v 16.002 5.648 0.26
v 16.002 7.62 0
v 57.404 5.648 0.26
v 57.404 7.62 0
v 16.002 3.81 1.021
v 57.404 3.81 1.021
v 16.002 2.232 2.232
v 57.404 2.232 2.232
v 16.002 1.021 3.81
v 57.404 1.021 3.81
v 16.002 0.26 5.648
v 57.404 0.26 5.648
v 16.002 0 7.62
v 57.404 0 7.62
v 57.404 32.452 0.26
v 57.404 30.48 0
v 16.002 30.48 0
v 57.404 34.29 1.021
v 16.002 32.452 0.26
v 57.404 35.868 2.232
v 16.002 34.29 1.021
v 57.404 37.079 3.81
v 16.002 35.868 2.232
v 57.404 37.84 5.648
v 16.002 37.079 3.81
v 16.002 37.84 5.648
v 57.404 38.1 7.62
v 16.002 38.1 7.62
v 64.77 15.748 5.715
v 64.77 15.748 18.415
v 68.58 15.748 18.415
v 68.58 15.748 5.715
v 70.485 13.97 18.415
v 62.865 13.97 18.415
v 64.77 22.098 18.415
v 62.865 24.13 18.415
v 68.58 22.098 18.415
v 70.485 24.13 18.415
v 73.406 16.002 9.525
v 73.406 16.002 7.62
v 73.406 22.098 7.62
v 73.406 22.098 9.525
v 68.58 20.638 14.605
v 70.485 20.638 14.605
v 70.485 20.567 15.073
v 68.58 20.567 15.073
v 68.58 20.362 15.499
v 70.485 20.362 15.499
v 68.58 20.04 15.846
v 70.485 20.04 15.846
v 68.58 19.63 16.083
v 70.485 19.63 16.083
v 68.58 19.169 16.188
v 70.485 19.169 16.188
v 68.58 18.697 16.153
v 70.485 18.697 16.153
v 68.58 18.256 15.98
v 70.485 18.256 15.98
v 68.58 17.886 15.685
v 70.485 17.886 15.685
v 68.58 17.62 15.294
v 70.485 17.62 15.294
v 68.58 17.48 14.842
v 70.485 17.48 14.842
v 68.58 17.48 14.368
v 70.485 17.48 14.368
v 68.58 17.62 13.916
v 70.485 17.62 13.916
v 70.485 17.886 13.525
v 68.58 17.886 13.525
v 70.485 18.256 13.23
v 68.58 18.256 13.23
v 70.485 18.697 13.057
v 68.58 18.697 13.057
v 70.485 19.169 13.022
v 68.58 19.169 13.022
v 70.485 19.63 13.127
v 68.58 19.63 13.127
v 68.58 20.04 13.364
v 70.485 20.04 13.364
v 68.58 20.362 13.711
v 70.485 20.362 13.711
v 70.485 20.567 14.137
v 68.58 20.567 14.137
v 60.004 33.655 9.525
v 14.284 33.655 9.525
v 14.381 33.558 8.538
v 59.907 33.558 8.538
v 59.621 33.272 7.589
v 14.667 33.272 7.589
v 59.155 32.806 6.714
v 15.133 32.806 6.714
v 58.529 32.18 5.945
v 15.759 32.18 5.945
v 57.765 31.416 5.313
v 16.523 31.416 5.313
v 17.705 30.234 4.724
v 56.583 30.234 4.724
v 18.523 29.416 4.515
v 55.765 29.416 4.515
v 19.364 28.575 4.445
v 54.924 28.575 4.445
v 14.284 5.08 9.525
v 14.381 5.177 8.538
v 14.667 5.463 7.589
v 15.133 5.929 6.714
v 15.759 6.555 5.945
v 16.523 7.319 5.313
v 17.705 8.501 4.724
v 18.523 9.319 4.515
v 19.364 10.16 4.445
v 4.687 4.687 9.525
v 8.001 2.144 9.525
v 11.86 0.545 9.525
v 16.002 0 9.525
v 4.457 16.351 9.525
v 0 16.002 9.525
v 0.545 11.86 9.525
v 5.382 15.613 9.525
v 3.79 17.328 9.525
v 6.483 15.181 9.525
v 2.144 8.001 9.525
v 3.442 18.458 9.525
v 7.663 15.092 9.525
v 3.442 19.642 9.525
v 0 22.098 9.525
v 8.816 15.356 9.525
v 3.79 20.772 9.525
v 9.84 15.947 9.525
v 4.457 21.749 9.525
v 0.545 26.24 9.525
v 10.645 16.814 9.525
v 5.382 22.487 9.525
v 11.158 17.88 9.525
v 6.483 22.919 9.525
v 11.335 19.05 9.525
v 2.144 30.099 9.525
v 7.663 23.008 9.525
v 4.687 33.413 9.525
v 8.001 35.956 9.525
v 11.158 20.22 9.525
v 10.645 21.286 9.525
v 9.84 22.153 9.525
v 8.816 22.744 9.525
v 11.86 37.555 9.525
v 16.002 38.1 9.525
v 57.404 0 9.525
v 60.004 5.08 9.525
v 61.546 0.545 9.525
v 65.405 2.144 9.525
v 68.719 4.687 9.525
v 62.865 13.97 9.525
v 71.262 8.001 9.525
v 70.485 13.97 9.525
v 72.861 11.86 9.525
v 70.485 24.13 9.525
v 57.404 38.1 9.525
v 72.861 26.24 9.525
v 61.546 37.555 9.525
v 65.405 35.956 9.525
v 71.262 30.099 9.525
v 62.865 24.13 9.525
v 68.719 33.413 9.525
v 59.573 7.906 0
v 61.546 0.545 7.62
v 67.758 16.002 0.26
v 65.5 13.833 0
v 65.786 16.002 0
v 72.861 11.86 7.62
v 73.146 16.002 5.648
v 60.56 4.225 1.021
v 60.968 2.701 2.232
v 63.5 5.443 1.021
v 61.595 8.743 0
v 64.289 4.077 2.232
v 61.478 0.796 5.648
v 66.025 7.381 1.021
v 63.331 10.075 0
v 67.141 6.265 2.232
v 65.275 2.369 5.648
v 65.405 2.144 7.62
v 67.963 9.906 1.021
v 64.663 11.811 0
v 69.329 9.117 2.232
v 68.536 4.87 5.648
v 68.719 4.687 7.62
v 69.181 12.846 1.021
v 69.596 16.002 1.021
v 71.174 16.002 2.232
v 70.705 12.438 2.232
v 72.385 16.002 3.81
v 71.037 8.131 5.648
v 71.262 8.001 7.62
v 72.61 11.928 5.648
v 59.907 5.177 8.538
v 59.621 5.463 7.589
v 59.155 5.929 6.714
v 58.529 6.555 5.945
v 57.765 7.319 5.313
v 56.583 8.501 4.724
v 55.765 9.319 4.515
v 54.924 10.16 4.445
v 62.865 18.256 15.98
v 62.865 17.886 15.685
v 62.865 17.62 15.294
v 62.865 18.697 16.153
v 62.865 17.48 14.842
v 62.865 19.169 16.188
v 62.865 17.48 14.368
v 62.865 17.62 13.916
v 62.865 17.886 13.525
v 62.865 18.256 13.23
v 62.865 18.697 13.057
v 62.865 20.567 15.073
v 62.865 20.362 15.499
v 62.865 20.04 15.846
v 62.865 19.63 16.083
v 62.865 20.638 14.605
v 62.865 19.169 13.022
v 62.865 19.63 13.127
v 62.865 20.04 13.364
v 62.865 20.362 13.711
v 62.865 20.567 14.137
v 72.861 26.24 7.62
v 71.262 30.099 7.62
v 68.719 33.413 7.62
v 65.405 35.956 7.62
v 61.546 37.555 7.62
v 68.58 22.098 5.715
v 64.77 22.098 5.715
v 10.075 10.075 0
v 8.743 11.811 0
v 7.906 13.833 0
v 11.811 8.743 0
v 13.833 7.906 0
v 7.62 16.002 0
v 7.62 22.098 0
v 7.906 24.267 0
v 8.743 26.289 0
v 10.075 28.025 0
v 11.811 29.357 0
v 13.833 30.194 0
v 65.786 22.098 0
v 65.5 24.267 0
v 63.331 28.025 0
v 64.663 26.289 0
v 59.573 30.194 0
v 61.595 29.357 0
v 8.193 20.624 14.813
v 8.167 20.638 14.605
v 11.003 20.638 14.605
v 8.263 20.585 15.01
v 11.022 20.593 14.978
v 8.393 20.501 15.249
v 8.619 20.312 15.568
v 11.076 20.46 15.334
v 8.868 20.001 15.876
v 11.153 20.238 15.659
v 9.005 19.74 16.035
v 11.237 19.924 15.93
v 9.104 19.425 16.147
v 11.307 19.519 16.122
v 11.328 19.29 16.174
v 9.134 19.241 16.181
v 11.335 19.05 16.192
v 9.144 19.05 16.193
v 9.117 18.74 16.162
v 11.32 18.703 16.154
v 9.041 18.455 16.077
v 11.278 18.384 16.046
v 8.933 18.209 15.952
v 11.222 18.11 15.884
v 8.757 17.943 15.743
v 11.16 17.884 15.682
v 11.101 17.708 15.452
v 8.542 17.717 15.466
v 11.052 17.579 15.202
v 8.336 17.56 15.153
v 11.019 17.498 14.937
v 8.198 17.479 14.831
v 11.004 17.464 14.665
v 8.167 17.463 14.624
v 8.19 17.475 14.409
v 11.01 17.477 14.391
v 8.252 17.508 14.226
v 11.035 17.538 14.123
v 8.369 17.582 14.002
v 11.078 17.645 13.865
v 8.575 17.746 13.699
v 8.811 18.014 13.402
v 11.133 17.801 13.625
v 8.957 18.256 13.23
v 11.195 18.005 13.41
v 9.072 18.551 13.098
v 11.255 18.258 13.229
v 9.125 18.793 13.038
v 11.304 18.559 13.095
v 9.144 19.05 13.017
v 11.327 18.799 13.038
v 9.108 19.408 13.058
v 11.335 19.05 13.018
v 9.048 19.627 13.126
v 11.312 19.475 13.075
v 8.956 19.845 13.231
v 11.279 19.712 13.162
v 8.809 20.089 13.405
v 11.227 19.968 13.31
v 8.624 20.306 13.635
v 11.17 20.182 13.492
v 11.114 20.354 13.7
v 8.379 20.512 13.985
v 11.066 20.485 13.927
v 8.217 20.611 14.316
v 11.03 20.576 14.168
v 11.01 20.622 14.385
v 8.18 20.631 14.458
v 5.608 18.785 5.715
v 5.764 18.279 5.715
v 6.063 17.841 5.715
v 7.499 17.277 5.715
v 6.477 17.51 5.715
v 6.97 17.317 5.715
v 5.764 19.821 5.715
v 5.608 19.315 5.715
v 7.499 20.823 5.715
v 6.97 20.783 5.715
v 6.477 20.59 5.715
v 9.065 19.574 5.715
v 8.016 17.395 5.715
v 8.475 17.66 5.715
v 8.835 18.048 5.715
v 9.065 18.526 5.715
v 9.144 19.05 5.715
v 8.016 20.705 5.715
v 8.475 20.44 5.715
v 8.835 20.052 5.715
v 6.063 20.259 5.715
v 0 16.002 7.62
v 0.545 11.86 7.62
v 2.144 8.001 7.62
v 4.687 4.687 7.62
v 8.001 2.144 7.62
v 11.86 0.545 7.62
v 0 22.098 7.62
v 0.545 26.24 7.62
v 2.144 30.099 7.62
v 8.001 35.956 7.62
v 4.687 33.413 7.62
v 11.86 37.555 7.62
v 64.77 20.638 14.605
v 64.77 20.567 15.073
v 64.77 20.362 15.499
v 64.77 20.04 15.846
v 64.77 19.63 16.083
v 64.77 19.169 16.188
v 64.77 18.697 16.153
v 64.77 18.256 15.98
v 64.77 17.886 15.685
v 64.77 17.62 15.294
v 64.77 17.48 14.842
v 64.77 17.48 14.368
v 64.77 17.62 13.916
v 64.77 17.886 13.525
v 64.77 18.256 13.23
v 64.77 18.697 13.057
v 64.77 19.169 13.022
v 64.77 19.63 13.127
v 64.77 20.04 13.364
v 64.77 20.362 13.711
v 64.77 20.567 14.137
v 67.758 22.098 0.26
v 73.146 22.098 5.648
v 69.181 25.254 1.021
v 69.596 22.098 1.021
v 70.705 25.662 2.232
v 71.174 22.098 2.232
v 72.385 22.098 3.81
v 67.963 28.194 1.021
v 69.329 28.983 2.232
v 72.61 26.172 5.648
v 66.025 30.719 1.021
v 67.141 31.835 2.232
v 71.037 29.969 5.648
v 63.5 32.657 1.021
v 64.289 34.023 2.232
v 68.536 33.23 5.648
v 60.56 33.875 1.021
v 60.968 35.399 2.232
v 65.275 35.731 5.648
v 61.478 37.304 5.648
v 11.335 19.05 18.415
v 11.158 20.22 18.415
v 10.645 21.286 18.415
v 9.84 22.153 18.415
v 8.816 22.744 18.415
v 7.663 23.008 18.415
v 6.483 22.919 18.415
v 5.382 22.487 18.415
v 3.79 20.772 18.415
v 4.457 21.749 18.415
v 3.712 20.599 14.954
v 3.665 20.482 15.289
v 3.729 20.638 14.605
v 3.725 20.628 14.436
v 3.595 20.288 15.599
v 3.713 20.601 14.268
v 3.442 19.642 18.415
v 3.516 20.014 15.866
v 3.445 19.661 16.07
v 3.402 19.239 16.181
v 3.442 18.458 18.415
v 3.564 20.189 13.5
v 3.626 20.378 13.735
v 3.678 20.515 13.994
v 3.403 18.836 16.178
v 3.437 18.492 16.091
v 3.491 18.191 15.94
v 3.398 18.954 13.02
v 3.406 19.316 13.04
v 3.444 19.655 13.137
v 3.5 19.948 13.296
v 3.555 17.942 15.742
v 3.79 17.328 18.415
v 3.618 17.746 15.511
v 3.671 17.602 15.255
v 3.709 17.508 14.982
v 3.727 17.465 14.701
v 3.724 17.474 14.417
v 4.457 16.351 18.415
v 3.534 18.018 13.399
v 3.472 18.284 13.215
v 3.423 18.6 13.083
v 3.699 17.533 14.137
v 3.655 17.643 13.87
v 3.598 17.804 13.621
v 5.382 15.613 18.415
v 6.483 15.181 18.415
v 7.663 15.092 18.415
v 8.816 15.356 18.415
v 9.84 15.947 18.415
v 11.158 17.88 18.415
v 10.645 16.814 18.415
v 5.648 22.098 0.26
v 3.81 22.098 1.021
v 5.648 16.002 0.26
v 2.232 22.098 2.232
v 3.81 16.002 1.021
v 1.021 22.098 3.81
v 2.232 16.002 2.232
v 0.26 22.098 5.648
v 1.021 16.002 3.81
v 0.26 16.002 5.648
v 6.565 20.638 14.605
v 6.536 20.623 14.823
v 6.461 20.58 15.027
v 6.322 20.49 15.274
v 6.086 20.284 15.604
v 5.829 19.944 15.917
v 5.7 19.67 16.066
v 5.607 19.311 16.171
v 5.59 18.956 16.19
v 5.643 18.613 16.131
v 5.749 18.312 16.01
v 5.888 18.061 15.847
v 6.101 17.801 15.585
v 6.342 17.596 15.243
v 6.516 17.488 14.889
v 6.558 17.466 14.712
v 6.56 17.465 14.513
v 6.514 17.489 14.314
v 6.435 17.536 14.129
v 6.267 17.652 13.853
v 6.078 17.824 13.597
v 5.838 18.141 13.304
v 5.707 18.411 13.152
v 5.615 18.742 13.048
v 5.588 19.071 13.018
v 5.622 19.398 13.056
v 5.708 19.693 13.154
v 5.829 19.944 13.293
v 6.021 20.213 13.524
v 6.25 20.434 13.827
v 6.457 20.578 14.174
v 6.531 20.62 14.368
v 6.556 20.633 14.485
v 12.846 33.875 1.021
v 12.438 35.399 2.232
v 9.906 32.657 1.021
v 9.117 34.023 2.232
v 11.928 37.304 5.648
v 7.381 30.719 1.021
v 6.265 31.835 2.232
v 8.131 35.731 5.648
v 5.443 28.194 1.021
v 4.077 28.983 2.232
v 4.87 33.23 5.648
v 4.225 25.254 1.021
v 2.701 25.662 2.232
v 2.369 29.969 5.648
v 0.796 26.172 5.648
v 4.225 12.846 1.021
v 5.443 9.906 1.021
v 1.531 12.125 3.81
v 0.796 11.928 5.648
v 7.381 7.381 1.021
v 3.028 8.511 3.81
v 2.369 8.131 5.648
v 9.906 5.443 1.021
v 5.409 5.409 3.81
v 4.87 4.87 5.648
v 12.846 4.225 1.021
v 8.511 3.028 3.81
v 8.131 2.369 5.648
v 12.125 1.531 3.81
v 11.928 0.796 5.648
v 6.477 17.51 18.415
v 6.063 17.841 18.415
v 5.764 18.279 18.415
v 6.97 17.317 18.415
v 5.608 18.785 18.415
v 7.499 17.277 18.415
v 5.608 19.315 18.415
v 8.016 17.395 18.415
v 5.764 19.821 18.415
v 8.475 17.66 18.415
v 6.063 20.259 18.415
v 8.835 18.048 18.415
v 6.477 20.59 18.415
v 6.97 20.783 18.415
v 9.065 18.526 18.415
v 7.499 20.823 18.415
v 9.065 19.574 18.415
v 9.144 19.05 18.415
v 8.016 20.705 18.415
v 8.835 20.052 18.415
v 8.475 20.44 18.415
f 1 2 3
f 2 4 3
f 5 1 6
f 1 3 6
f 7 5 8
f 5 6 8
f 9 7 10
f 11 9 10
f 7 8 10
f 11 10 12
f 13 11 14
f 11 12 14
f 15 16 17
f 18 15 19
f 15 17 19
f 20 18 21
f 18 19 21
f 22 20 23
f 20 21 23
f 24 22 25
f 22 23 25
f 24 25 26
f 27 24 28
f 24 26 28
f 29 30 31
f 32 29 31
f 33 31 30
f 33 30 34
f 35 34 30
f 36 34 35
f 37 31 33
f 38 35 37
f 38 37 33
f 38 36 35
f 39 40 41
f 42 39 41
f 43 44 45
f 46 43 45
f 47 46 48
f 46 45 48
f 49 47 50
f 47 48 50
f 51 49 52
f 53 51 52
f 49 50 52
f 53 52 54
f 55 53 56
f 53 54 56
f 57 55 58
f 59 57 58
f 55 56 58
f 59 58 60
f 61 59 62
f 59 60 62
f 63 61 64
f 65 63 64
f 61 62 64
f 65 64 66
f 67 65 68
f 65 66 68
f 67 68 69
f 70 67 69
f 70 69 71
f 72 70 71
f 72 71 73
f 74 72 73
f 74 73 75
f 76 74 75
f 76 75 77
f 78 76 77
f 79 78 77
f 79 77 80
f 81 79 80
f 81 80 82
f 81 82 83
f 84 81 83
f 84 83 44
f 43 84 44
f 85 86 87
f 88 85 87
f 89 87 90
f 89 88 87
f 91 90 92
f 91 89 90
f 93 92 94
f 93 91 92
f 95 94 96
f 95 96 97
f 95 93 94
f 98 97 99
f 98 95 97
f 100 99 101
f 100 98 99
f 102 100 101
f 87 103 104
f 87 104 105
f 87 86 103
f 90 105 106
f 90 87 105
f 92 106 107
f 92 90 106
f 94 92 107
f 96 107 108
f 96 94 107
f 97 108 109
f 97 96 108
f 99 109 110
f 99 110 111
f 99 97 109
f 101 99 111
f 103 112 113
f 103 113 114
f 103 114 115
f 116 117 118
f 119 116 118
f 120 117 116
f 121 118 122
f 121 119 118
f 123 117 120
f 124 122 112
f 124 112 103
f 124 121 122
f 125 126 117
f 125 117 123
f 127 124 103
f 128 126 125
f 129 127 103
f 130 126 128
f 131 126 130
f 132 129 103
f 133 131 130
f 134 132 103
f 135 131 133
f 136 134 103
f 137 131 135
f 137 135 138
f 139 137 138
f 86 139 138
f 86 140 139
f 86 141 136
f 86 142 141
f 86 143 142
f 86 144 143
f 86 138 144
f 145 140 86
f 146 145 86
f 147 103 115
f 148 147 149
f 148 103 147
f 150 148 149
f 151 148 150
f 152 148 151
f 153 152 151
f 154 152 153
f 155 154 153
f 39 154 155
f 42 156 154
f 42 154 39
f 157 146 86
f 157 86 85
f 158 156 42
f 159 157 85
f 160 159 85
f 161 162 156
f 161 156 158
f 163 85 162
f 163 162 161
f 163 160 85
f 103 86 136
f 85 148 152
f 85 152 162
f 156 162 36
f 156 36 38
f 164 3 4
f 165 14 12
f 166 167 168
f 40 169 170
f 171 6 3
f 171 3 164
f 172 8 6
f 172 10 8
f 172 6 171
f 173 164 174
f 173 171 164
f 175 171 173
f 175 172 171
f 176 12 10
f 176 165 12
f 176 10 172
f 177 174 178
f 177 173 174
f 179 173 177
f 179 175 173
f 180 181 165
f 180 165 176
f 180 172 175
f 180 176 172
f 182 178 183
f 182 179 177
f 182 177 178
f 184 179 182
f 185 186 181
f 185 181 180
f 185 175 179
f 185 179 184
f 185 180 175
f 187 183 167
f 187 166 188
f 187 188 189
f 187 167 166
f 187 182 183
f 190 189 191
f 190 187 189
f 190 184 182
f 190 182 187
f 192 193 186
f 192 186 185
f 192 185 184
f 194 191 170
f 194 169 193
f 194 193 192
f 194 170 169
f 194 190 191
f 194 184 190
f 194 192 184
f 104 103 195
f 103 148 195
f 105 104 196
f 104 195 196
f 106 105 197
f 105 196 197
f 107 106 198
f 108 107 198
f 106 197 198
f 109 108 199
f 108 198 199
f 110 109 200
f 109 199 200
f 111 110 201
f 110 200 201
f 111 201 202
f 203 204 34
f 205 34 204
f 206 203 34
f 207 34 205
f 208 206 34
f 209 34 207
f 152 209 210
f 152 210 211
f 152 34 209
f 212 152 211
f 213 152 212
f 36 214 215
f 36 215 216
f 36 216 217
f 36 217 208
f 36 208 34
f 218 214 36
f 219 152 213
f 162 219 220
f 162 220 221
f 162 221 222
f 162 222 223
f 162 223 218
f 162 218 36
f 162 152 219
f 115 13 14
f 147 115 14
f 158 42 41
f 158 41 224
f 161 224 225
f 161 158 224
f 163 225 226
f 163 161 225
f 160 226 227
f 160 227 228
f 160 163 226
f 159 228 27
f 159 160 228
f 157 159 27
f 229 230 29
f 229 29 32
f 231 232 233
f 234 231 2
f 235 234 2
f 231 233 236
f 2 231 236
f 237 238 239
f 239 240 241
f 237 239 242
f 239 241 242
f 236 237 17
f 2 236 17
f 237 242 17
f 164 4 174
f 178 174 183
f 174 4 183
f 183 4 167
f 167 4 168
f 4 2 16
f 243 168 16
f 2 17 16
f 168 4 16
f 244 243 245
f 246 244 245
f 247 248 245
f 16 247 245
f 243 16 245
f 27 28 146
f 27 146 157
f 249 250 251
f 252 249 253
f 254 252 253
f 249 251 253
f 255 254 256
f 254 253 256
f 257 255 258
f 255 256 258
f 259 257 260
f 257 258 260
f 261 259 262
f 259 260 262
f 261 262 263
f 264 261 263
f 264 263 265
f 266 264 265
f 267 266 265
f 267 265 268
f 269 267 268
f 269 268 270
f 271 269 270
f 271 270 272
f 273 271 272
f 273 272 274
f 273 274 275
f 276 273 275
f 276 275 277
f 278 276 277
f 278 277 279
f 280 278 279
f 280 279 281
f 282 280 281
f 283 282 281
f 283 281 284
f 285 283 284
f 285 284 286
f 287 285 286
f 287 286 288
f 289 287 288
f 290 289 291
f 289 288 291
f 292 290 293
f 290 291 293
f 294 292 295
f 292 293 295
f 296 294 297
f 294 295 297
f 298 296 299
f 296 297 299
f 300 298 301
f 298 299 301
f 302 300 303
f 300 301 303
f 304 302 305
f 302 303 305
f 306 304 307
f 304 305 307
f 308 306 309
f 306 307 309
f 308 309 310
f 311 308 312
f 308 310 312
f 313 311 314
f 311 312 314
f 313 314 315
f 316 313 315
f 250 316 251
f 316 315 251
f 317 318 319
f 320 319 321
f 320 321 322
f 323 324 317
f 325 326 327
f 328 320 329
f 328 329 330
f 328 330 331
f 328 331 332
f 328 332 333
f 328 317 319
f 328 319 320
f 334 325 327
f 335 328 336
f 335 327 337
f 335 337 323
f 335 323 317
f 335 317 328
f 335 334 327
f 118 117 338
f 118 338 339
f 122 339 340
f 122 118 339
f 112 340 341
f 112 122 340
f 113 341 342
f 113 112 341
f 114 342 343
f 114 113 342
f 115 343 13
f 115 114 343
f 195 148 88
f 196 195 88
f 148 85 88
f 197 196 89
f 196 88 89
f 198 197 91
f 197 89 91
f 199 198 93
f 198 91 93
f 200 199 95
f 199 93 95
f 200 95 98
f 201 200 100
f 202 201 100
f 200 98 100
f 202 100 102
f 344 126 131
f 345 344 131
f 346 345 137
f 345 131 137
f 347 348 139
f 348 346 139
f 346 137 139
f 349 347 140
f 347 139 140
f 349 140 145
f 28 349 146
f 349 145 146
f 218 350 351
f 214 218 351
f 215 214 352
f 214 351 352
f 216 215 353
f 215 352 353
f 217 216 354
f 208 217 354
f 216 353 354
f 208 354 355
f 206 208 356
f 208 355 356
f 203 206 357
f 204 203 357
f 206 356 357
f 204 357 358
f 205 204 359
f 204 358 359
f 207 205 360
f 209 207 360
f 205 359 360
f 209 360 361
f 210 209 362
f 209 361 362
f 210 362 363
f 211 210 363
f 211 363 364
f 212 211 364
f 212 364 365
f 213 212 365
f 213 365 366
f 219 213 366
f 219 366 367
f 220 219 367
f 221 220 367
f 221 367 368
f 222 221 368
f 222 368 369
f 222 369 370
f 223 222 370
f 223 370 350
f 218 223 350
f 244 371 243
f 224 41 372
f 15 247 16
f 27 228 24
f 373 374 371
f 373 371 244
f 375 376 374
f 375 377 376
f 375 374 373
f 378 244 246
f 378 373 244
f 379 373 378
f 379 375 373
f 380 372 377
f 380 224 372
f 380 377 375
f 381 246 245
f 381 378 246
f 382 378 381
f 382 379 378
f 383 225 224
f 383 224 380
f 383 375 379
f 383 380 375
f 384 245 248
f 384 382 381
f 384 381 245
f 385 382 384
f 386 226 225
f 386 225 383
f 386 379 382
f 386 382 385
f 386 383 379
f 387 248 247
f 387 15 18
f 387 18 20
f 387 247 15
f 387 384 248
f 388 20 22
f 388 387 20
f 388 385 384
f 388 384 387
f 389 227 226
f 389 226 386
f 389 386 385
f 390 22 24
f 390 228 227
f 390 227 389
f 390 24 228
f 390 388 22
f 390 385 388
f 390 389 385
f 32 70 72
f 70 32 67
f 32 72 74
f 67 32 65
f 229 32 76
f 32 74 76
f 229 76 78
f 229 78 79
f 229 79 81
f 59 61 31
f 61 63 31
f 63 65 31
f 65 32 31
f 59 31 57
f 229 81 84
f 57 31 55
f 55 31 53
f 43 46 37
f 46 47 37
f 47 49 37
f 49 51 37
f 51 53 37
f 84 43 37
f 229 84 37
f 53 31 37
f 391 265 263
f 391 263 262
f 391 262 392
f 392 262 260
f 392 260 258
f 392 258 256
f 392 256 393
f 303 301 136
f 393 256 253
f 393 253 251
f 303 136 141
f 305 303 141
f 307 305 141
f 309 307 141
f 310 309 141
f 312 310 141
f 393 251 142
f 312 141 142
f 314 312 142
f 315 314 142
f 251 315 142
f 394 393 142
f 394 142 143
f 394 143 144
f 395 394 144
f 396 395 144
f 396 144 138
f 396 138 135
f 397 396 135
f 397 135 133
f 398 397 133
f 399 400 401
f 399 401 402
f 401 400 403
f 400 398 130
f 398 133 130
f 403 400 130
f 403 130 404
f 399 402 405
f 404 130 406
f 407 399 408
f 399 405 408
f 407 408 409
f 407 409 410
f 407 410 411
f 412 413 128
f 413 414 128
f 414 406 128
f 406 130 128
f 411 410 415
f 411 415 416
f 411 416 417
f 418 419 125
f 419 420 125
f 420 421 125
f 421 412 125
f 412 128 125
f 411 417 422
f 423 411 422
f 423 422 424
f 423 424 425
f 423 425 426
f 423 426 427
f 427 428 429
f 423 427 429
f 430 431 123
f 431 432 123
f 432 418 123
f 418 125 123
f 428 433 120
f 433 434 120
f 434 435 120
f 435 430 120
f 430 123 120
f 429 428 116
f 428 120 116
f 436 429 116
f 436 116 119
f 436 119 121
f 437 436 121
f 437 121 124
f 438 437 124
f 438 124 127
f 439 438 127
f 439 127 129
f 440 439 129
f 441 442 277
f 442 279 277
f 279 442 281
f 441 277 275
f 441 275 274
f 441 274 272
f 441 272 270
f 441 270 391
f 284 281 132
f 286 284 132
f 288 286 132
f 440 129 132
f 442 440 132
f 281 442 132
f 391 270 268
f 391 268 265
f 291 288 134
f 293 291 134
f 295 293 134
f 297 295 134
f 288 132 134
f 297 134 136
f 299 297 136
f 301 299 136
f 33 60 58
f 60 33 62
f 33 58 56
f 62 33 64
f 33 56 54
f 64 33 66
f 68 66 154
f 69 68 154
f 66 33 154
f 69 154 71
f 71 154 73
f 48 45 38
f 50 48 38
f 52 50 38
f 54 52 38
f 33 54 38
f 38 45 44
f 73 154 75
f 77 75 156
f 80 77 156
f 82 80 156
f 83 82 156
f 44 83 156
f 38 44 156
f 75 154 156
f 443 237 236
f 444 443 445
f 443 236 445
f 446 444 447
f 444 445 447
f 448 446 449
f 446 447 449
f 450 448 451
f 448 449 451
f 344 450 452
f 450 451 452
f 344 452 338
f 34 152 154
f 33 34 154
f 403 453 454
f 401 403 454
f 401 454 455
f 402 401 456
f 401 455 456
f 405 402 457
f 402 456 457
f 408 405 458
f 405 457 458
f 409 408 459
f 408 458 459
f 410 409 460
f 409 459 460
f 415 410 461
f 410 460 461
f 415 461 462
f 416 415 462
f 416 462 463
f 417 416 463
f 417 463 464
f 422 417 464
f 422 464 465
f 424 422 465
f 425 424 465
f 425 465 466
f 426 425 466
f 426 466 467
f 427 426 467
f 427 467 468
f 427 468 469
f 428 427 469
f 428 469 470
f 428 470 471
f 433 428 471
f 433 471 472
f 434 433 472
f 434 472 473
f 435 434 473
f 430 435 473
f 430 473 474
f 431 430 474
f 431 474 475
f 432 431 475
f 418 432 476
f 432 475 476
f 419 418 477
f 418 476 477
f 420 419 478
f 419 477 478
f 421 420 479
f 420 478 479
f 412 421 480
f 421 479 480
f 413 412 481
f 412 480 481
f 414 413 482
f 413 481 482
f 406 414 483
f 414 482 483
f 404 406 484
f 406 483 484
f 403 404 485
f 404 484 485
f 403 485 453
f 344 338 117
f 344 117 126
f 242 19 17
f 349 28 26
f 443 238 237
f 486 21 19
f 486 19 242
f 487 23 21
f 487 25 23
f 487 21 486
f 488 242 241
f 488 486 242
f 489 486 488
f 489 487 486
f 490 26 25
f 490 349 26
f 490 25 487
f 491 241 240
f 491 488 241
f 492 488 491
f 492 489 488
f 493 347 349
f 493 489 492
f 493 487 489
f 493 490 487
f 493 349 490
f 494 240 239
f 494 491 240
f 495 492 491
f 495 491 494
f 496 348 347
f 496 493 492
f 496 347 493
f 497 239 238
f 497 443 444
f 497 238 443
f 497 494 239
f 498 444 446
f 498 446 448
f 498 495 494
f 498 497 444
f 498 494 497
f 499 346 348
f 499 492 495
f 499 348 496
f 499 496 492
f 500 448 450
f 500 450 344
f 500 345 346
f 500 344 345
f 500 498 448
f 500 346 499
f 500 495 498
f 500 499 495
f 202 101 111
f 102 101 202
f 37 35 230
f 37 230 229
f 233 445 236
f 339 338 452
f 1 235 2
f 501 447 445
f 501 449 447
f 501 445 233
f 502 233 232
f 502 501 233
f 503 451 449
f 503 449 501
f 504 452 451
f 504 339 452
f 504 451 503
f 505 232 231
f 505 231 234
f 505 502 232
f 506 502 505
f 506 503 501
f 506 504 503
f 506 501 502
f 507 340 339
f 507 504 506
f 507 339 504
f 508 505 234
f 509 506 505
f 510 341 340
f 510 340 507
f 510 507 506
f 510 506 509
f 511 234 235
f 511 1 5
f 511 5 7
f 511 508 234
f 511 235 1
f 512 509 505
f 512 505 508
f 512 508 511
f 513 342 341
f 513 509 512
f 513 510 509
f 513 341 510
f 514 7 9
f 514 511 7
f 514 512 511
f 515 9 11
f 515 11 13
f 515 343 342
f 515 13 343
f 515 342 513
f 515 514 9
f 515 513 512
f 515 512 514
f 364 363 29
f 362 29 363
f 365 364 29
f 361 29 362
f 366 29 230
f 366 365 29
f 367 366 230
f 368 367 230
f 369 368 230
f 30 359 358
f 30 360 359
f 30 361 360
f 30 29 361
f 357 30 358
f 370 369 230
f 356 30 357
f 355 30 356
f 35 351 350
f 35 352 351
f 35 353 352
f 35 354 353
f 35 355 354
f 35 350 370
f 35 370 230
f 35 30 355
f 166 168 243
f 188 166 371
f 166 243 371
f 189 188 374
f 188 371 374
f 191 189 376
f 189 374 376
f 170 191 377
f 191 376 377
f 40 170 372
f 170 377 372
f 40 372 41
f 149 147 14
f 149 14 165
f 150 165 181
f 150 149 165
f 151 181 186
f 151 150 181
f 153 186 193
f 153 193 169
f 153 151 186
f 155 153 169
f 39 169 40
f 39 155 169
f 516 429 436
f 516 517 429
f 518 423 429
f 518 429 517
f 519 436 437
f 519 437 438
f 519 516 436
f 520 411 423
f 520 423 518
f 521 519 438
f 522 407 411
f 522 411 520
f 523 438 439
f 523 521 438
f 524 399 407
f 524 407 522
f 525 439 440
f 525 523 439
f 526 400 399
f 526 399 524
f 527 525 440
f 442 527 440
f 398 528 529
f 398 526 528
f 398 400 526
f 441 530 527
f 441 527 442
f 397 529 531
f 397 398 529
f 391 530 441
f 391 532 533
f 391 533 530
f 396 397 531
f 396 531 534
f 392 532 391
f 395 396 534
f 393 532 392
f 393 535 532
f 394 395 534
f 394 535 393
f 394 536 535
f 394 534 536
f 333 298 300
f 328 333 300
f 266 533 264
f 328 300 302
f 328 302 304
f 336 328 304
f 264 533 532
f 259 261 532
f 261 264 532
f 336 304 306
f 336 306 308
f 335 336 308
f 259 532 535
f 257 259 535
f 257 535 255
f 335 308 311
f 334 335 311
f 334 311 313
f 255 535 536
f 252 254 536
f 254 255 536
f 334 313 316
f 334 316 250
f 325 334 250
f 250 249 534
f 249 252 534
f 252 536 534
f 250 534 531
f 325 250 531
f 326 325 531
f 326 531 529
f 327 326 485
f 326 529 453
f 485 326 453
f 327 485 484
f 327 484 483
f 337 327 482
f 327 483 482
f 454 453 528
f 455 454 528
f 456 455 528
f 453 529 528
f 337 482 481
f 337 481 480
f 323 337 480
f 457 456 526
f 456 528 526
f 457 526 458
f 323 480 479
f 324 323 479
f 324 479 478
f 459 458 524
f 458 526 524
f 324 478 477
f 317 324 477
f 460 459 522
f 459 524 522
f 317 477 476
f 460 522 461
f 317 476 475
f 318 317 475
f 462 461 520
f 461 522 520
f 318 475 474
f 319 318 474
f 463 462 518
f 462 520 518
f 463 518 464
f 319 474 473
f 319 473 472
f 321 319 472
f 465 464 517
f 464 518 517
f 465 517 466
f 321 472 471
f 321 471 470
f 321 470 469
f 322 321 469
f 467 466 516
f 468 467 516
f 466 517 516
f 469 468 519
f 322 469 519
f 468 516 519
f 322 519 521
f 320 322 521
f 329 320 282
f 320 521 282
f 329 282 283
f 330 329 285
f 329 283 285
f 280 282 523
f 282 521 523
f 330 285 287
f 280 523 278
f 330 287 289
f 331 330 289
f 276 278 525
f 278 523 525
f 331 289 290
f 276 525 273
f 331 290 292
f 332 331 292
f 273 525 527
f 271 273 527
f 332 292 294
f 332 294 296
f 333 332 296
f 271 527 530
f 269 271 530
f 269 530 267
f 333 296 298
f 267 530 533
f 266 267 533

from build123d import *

# Parameters (mm, degrees)
F0_W      = 73.406
F0_H      = 38.1
F1_DEPTH  = 9.525
F2_R      = 16.002
F3_R      = 3.96875
F3_W      = 7.62
F3_H      = 10.16
F4_DEPTH  = 8.89
F5_R      = 1.5875
F6_DEPTH  = 68.58
F7_R      = 1.778
F7_W      = 3.81
F7_H      = 6.35
F8_DEPTH  = 12.7
F9_R      = 7.62
F10_W     = 45.72
F10_H     = 28.575
F11_DEPTH = 5.08
F12_R     = 5.07999


# Not quite as in the source:
# - a fillet or chamfer is up to 0.001 mm smaller than in the source, because OpenCascade refuses the exact size


with BuildPart() as f1:
    # F0 (on Top) → F1 (new body)
    with BuildSketch(Plane.XY):
        with Locations((36.703, 19.05)):
            Rectangle(F0_W, F0_H)
    extrude(amount=F1_DEPTH)

    # F2
    f2_edges = [f1.edges().sort_by_distance(p)[0] for p in [
        (0, 38.1, 4.7625),
        (0, 0, 4.7625),
        (73.406, 38.1, 4.7625),
        (73.406, 0, 4.7625),
    ]]
    fillet(f2_edges, radius=F2_R)

    # F3 (on face) → F4 (join)
    with BuildSketch(Plane.XY.offset(9.525)):
        with Locations((7.366, 19.05)):
            Circle(F3_R)
        with Locations((66.675, 19.05)):
            Rectangle(F3_W, F3_H)
    extrude(amount=F4_DEPTH)

    # F5 (on face) → F6 (cut)
    with BuildSketch(Plane.YZ.offset(70.485)):
        with Locations((19.05, 14.605)):
            Circle(F5_R)
    extrude(amount=-F6_DEPTH, mode=Mode.SUBTRACT)

    # F7 (on face) → F8 (cut)
    with BuildSketch(Plane.XY.offset(18.415)):
        with Locations((7.366, 19.05)):
            Circle(F7_R)
        with Locations((66.675, 18.923)):
            Rectangle(F7_W, F7_H)
    extrude(amount=-F8_DEPTH, mode=Mode.SUBTRACT)

    # F9
    f9_edges = [f1.edges().sort_by_distance(p)[0] for p in [
        (36.703, 0, 0),
    ]]
    fillet(f9_edges, radius=F9_R)

    # F10 (on face) → F11 (cut)
    with BuildSketch(Plane.XY.offset(9.525)):
        with Locations((37.1440443242, 19.3675)):
            Rectangle(F10_W, F10_H)
    extrude(amount=-F11_DEPTH, mode=Mode.SUBTRACT)

    # F12 (radius 5.08 in the source; OpenCascade refuses exactly that, so slightly less here)
    f12_edges = [f1.edges().sort_by_distance(p)[0] for p in [
        (60.004044, 19.3675, 4.445),
        (37.144044, 33.655, 4.445),
        (14.284044, 19.3675, 4.445),
        (37.144044, 5.08, 4.445),
    ]]
    fillet(f12_edges, radius=F12_R)


solid = f1.part
